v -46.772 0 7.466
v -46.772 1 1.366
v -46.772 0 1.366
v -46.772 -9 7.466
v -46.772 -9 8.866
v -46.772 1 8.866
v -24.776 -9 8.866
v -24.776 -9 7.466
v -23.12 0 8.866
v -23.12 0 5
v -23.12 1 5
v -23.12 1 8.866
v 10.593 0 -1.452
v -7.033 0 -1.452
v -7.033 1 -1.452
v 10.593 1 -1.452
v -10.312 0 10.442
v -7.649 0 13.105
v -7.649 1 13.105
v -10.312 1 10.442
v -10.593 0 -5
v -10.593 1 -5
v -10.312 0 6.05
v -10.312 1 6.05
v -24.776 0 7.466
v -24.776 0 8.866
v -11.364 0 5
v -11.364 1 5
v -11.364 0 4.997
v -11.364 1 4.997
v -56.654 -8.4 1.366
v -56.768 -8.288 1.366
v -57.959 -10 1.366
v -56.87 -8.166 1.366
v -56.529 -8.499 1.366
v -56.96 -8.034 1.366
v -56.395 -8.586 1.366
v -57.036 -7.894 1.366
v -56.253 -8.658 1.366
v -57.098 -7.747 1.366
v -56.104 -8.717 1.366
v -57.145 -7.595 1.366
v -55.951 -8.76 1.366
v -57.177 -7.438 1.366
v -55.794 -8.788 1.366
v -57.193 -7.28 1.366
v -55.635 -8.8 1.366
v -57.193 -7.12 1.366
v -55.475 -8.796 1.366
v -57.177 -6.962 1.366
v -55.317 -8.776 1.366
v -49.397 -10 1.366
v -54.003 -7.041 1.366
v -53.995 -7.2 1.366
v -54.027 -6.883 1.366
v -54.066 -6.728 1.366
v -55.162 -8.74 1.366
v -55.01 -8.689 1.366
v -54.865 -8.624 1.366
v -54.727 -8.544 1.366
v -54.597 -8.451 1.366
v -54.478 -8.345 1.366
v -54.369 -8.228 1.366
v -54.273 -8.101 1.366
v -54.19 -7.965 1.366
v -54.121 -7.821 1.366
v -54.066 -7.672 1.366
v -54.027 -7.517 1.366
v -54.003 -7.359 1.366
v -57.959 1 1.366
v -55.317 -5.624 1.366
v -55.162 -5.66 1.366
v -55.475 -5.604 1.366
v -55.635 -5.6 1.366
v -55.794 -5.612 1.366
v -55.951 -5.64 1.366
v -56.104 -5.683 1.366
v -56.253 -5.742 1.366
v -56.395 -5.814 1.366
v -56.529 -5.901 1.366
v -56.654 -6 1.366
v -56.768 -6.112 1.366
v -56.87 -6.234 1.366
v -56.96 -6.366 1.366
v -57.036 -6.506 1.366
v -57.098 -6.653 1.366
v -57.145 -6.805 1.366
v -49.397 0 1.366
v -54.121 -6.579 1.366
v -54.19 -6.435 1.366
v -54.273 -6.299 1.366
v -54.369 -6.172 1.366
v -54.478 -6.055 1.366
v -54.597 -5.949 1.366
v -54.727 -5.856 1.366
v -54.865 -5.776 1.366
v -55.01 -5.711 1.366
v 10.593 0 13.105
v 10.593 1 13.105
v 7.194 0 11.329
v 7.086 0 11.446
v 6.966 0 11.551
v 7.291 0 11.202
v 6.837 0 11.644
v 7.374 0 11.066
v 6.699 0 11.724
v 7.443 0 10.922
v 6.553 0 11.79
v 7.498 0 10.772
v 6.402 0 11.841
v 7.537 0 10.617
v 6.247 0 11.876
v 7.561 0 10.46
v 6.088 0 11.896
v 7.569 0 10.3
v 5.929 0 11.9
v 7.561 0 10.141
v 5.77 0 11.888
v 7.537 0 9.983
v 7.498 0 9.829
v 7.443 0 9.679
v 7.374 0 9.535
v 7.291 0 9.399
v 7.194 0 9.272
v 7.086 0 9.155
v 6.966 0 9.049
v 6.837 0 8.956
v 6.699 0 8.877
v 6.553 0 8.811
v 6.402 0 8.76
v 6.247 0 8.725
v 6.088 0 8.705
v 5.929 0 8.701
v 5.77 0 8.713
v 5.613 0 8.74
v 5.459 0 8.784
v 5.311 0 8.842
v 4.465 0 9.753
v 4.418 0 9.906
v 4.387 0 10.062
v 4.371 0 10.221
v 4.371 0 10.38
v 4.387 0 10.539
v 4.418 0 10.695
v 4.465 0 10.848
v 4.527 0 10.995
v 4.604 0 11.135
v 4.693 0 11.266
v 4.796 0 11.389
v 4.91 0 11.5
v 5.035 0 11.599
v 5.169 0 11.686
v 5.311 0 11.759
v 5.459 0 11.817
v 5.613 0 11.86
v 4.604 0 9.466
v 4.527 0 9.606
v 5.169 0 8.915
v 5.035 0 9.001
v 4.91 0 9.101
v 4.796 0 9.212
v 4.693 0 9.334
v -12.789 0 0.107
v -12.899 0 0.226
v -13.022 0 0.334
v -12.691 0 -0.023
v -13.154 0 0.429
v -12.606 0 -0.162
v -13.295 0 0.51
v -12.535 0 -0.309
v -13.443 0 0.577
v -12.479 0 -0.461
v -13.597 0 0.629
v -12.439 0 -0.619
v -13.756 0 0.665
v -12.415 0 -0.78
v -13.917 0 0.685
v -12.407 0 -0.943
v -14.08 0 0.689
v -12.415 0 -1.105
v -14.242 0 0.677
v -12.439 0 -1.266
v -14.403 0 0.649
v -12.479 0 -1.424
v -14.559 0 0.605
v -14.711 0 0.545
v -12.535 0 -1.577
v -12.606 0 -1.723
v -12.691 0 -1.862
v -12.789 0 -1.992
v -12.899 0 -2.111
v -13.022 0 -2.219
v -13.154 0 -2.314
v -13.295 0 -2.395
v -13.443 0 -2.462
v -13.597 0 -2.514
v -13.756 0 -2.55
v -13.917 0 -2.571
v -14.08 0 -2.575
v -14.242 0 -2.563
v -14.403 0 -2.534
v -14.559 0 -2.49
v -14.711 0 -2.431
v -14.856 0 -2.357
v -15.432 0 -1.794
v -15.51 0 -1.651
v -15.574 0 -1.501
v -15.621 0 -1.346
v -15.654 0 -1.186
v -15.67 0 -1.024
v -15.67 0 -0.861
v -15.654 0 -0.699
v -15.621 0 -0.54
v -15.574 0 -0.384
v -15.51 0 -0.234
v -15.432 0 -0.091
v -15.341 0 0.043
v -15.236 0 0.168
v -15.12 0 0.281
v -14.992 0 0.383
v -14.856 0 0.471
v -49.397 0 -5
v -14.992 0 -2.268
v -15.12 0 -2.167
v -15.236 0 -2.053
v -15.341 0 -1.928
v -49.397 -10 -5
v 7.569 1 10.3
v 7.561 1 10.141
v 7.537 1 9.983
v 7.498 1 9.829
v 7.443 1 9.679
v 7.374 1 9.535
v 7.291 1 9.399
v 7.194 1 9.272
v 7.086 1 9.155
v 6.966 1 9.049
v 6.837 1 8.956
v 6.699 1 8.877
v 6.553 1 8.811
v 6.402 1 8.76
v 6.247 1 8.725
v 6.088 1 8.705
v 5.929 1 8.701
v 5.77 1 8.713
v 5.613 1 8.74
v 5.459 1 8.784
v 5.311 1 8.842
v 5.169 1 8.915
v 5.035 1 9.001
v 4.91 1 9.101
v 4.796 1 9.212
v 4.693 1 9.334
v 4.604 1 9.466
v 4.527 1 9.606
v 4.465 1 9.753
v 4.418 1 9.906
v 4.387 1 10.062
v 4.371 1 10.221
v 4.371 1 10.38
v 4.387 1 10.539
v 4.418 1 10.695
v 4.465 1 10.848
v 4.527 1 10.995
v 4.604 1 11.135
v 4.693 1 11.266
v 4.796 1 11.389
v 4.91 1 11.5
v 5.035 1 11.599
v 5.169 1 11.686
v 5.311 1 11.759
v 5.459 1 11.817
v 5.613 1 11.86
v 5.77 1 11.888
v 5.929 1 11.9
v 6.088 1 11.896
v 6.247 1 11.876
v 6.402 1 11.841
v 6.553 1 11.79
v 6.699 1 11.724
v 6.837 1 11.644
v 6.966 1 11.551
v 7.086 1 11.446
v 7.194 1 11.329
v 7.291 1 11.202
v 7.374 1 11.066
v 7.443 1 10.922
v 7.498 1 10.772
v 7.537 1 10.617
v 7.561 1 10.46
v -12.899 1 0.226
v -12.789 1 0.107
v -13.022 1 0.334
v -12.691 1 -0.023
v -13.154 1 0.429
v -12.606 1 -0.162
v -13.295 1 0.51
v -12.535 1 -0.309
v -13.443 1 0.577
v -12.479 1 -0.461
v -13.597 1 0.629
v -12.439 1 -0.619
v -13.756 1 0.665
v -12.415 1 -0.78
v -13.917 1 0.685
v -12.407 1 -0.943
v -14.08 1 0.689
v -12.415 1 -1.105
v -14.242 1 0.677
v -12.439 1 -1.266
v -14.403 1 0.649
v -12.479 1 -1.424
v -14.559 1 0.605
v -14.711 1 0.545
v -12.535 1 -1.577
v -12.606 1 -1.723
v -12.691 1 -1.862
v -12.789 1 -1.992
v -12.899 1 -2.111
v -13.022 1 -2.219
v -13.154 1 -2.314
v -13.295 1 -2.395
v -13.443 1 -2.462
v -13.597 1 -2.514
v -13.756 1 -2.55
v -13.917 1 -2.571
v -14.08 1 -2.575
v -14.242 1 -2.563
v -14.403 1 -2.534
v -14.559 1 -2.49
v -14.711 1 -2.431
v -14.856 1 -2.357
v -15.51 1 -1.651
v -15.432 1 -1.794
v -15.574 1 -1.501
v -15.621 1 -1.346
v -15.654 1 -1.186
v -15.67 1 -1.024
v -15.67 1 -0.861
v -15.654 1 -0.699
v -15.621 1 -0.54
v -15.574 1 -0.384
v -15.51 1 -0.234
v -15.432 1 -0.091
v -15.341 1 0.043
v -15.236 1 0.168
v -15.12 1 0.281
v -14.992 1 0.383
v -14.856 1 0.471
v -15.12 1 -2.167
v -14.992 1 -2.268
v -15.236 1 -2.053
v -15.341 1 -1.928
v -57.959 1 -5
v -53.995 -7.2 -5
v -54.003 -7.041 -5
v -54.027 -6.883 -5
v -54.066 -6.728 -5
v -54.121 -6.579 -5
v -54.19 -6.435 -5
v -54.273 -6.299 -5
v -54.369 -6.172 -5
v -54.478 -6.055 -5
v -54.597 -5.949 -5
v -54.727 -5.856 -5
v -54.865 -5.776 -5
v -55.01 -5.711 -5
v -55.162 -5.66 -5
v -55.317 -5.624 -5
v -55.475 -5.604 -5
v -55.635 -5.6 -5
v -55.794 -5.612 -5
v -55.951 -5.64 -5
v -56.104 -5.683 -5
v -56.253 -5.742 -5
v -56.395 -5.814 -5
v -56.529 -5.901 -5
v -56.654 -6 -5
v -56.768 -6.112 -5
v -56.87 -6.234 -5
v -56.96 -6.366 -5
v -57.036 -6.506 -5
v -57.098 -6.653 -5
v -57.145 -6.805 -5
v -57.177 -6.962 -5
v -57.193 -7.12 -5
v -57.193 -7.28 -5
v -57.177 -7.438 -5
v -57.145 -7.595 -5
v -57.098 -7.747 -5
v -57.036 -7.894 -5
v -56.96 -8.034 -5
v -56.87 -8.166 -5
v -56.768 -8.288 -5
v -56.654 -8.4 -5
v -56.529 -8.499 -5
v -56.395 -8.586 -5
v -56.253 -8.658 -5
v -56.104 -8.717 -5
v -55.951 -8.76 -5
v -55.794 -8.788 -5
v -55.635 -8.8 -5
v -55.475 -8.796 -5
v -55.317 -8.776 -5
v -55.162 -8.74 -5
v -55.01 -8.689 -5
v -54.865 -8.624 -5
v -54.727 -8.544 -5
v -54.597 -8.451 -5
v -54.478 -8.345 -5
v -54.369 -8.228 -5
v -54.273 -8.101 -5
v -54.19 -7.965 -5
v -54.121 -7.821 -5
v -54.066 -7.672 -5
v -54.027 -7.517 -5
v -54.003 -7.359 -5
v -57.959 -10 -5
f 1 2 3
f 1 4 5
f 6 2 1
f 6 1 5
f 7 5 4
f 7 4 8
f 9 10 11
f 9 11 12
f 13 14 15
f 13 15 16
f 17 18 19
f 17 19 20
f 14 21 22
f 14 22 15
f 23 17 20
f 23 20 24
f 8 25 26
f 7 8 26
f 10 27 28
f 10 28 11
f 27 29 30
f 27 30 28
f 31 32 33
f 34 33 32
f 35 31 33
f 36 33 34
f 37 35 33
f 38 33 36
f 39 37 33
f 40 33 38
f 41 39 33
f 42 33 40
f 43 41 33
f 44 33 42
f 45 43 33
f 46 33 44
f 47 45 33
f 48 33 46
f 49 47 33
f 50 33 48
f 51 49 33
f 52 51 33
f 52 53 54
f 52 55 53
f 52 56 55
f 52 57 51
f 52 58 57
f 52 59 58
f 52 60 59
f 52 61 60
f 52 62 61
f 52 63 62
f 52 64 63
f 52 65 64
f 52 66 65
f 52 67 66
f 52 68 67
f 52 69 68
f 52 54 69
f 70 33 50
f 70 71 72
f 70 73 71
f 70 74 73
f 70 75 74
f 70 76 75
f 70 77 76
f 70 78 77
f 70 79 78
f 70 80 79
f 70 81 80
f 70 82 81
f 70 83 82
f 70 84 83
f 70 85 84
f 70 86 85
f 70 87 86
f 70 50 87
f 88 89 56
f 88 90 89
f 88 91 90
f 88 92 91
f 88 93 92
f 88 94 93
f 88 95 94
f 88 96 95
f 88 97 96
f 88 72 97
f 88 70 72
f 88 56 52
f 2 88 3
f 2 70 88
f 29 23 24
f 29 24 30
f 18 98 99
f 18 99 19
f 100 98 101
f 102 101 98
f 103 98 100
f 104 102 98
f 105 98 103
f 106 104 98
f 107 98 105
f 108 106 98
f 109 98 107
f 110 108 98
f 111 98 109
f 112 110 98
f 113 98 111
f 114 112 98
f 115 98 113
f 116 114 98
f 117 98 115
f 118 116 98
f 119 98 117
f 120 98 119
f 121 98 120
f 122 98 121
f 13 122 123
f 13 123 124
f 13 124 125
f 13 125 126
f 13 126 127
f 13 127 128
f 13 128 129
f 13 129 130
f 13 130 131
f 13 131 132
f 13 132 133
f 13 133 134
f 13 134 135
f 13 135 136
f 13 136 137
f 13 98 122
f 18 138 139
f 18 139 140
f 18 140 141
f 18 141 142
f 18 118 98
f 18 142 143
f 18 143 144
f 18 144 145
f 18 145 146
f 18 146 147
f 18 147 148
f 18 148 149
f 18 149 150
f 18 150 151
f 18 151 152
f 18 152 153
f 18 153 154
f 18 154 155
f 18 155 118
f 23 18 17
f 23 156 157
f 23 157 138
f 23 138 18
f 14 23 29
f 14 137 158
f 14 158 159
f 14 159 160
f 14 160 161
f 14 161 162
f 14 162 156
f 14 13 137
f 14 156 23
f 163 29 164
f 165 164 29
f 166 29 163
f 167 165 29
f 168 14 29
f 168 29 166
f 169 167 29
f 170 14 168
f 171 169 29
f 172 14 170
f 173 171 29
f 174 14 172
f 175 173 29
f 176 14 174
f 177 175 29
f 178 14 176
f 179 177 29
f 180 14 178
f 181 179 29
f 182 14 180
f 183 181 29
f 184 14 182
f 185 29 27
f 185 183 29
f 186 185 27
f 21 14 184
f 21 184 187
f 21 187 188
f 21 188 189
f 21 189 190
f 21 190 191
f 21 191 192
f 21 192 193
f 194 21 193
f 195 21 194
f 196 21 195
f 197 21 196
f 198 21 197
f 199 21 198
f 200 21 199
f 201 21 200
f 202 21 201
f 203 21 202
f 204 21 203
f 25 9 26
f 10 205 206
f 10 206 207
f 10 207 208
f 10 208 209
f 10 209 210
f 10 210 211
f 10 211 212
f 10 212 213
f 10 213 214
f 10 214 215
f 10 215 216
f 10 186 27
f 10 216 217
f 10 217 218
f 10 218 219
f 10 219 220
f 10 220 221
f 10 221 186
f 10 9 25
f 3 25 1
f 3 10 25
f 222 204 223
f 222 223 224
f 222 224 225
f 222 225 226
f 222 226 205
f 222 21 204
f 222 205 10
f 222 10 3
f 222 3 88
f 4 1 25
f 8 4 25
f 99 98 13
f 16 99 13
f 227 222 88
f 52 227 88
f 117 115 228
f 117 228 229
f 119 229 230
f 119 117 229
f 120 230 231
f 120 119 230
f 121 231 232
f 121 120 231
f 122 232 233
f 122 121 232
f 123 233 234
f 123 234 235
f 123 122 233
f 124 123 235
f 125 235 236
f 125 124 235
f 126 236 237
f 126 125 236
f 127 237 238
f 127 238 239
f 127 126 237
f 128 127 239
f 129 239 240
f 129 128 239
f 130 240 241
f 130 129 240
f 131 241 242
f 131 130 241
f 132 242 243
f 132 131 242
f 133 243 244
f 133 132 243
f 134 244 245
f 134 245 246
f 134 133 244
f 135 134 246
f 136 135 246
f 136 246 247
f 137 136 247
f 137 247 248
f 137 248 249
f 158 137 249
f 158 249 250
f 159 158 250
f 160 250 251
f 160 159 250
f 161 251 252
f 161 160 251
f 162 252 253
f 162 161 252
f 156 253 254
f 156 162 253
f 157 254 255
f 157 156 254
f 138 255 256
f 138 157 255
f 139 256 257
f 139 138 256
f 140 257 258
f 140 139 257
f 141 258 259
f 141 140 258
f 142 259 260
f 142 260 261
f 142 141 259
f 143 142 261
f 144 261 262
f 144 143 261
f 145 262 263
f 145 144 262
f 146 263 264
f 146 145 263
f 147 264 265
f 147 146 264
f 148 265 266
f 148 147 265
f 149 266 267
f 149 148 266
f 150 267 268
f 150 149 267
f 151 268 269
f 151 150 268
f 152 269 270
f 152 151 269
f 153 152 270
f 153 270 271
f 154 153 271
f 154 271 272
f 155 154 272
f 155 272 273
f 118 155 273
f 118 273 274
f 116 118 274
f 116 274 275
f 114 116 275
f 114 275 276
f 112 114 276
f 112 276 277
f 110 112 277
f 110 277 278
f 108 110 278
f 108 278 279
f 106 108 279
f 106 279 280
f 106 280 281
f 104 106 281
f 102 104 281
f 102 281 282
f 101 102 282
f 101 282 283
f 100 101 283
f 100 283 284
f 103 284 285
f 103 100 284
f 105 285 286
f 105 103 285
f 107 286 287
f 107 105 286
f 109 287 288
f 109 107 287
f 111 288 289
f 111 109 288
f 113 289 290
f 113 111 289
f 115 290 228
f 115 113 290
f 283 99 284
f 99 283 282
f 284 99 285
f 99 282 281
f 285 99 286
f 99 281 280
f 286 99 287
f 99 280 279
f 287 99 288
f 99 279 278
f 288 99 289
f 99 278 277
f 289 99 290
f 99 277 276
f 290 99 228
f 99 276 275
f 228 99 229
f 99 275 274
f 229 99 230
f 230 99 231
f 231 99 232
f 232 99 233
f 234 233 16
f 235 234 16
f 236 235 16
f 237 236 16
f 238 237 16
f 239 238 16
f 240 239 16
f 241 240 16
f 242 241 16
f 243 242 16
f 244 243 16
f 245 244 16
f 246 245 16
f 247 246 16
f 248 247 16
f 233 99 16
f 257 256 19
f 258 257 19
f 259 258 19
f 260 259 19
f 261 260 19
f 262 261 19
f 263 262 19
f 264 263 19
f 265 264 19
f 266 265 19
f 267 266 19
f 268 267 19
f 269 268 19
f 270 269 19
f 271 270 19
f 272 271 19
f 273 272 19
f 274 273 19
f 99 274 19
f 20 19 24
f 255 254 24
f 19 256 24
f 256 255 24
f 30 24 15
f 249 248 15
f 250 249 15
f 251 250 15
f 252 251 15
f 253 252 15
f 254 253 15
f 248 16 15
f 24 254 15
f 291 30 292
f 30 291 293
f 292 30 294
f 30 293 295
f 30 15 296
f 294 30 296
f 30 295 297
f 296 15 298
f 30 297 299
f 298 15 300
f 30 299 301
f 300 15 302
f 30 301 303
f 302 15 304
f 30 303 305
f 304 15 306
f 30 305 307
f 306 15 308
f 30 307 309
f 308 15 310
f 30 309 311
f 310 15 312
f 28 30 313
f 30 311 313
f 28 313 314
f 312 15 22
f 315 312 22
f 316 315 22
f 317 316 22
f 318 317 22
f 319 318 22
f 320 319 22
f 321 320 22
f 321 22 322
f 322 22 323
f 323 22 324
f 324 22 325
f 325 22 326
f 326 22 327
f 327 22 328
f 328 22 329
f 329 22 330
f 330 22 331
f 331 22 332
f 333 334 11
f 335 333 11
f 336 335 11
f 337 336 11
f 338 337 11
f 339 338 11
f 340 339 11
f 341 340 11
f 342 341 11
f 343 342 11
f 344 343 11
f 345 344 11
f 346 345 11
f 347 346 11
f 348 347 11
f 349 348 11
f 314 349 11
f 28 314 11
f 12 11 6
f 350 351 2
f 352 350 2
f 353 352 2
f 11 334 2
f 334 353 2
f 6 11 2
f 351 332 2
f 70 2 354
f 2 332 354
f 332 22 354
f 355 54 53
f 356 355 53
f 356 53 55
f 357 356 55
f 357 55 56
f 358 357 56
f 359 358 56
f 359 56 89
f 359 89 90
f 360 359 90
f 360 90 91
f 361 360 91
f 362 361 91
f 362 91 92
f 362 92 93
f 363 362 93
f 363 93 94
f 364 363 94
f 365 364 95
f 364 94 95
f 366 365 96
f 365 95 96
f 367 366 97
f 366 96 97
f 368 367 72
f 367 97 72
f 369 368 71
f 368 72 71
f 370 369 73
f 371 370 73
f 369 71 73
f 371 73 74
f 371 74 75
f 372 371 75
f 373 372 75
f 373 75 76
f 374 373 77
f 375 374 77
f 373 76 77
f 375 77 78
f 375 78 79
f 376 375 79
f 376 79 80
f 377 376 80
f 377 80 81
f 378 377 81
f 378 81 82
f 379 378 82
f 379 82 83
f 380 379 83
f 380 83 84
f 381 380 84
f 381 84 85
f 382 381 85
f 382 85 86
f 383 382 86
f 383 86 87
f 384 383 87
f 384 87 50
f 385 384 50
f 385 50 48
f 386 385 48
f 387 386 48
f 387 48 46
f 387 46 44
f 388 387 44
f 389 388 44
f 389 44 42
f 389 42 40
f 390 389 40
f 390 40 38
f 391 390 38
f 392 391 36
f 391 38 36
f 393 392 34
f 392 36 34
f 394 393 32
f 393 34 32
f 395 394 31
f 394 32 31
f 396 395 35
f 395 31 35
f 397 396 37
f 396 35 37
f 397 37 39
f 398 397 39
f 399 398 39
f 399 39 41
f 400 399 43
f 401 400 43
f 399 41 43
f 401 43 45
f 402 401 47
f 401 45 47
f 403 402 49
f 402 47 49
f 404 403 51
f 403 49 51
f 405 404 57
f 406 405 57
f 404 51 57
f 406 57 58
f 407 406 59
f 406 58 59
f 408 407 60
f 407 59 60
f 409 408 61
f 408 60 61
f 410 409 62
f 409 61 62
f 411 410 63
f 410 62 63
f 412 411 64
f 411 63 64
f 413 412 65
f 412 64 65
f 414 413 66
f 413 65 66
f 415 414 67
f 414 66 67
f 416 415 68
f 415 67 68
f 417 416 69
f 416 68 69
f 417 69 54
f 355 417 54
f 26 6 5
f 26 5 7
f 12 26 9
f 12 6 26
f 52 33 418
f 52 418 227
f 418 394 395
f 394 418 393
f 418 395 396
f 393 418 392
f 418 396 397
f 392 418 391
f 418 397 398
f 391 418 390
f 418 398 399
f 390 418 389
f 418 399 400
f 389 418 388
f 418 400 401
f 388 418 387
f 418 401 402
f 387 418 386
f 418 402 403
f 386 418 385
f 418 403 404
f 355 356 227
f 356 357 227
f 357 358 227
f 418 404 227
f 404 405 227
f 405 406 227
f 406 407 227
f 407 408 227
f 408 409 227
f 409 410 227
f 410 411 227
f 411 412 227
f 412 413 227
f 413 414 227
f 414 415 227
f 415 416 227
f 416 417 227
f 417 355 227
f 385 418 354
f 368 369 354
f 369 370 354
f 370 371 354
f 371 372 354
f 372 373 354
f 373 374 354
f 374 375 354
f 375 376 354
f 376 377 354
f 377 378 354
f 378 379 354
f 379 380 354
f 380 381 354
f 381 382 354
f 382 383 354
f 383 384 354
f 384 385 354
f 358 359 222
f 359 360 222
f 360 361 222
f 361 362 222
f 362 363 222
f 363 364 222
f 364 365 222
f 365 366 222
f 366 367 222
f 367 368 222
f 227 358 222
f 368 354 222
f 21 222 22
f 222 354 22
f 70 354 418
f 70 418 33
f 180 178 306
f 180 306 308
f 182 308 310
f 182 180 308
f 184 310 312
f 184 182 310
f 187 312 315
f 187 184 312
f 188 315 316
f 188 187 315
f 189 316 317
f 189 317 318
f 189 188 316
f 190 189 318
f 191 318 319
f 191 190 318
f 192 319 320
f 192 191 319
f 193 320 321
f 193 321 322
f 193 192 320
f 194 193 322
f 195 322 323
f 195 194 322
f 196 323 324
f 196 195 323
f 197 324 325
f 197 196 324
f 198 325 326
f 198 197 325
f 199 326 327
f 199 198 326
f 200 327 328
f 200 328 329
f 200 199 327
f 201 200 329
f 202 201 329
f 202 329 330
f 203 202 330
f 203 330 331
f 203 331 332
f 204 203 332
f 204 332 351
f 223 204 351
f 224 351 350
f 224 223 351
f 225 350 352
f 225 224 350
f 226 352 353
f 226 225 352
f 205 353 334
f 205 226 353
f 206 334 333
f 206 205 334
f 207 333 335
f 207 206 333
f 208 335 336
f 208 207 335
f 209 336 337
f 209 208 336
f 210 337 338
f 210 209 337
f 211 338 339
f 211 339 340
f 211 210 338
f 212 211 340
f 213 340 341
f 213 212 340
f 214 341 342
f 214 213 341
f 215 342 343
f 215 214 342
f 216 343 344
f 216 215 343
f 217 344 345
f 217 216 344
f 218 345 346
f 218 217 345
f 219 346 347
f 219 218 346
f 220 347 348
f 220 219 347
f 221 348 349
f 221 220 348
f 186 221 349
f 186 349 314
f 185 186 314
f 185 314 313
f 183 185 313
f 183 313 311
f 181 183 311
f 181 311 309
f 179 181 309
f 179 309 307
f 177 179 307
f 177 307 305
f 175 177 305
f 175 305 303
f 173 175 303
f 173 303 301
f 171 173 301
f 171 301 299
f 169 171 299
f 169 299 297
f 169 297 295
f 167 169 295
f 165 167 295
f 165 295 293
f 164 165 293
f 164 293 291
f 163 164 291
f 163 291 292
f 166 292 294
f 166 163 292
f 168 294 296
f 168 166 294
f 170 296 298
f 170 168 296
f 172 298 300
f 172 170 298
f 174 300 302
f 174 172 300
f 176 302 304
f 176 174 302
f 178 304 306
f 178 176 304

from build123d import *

# Parameters (mm, degrees)
SKETCH_1_R          = 1.632566579
SKETCH_1_R_2        = 1.6
EXTRUDE_1_DEPTH     = 1
SKETCH_2_W          = 21.996438878
SKETCH_2_H          = 1.4
EXTRUDE_2_DEPTH     = 9
SKETCH_3_W          = 9.861847607
SKETCH_3_H          = 7.366382786
EXTRUDE_3_DEPTH     = 10
CUT_EXTRUDE_1_REACH = 9.366
SKETCH_5_R          = 1.6
CUT_EXTRUDE_2_REACH = 13


with BuildPart() as part:
    # 草图1 → 凸台-拉伸1 (new body)
    with BuildSketch(Plane(origin=(0, 0, 0), x_dir=(1, 0, 0), z_dir=(0, 1, 0))):
        Polygon((-59.259088641, 5), (-10.592885375, 5), (-7.033226841, 1.452276921), (10.592885375, 1.452276921), (10.592885375, -5), (10.592885375, -13.105286597), (-7.648958362, -13.105286597), (-10.311746214, -10.442498745), (-10.311746214, -6.049690331), (-11.364057651, -4.997378894), (-11.364090146, -5), (-23.120004307, -5), (-23.120004307, -8.866382786), (-46.772006656, -8.866382786), (-46.772006656, -2.366382786), (-59.259088641, -2.366382786), (-59.259088641, 0), align=None)
        with Locations((-14.039400366, 0.94270398)):
            Circle(SKETCH_1_R, mode=Mode.SUBTRACT)
        with Locations((5.968790226, -10.300345076)):
            Circle(SKETCH_1_R_2, mode=Mode.SUBTRACT)
    extrude(amount=EXTRUDE_1_DEPTH)

    # 草图2 → 凸台-拉伸2 (add)
    with BuildSketch(Plane.XZ):
        with Locations((-35.773787217, 8.166382786)):
            Rectangle(SKETCH_2_W, SKETCH_2_H)
    extrude(amount=EXTRUDE_2_DEPTH)

    # 草图3 → 凸台-拉伸3 (add)
    with BuildSketch(Plane.XZ):
        with Locations((-54.328164838, -1.316808607)):
            Rectangle(SKETCH_3_W, SKETCH_3_H)
    extrude(amount=EXTRUDE_3_DEPTH)

    # 草图5 → 切除-拉伸1 (cut, up to next)
    with BuildSketch(Plane.XY.offset(2.366382786), mode=Mode.PRIVATE) as cut_extrude_1_sk1:
        with Locations((-55.594883285, -7.2)):
            Circle(SKETCH_5_R)
    cut_extrude_1_tool1 = extrude(cut_extrude_1_sk1.sketch, amount=-CUT_EXTRUDE_1_REACH, mode=Mode.PRIVATE) & part.part
    add(cut_extrude_1_tool1.solids().sort_by_distance((-55.594883, -7.2, 2.366383))[0], mode=Mode.SUBTRACT)

    # 草图6 → 切除-拉伸2 (cut, up to next)
    with BuildSketch(Plane(origin=(0, 1, 0), x_dir=(1, 0, 0), z_dir=(0, 1, 0)), mode=Mode.PRIVATE) as cut_extrude_2_sk1:
        Polygon((-59.259088641, 5), (-57.959088641, 5), (-57.959088641, -1.366382786), (-46.772006656, -1.366382786), (-46.772006656, -2.366382786), (-57.959088641, -2.366382786), (-59.259088641, -2.366382786), align=None)
    cut_extrude_2_tool1 = extrude(cut_extrude_2_sk1.sketch, amount=-CUT_EXTRUDE_2_REACH, mode=Mode.PRIVATE) & part.part
    add(cut_extrude_2_tool1.solids().sort_by_distance((-58.609089, 1, -4.85502))[0], mode=Mode.SUBTRACT)


solid = part.part
